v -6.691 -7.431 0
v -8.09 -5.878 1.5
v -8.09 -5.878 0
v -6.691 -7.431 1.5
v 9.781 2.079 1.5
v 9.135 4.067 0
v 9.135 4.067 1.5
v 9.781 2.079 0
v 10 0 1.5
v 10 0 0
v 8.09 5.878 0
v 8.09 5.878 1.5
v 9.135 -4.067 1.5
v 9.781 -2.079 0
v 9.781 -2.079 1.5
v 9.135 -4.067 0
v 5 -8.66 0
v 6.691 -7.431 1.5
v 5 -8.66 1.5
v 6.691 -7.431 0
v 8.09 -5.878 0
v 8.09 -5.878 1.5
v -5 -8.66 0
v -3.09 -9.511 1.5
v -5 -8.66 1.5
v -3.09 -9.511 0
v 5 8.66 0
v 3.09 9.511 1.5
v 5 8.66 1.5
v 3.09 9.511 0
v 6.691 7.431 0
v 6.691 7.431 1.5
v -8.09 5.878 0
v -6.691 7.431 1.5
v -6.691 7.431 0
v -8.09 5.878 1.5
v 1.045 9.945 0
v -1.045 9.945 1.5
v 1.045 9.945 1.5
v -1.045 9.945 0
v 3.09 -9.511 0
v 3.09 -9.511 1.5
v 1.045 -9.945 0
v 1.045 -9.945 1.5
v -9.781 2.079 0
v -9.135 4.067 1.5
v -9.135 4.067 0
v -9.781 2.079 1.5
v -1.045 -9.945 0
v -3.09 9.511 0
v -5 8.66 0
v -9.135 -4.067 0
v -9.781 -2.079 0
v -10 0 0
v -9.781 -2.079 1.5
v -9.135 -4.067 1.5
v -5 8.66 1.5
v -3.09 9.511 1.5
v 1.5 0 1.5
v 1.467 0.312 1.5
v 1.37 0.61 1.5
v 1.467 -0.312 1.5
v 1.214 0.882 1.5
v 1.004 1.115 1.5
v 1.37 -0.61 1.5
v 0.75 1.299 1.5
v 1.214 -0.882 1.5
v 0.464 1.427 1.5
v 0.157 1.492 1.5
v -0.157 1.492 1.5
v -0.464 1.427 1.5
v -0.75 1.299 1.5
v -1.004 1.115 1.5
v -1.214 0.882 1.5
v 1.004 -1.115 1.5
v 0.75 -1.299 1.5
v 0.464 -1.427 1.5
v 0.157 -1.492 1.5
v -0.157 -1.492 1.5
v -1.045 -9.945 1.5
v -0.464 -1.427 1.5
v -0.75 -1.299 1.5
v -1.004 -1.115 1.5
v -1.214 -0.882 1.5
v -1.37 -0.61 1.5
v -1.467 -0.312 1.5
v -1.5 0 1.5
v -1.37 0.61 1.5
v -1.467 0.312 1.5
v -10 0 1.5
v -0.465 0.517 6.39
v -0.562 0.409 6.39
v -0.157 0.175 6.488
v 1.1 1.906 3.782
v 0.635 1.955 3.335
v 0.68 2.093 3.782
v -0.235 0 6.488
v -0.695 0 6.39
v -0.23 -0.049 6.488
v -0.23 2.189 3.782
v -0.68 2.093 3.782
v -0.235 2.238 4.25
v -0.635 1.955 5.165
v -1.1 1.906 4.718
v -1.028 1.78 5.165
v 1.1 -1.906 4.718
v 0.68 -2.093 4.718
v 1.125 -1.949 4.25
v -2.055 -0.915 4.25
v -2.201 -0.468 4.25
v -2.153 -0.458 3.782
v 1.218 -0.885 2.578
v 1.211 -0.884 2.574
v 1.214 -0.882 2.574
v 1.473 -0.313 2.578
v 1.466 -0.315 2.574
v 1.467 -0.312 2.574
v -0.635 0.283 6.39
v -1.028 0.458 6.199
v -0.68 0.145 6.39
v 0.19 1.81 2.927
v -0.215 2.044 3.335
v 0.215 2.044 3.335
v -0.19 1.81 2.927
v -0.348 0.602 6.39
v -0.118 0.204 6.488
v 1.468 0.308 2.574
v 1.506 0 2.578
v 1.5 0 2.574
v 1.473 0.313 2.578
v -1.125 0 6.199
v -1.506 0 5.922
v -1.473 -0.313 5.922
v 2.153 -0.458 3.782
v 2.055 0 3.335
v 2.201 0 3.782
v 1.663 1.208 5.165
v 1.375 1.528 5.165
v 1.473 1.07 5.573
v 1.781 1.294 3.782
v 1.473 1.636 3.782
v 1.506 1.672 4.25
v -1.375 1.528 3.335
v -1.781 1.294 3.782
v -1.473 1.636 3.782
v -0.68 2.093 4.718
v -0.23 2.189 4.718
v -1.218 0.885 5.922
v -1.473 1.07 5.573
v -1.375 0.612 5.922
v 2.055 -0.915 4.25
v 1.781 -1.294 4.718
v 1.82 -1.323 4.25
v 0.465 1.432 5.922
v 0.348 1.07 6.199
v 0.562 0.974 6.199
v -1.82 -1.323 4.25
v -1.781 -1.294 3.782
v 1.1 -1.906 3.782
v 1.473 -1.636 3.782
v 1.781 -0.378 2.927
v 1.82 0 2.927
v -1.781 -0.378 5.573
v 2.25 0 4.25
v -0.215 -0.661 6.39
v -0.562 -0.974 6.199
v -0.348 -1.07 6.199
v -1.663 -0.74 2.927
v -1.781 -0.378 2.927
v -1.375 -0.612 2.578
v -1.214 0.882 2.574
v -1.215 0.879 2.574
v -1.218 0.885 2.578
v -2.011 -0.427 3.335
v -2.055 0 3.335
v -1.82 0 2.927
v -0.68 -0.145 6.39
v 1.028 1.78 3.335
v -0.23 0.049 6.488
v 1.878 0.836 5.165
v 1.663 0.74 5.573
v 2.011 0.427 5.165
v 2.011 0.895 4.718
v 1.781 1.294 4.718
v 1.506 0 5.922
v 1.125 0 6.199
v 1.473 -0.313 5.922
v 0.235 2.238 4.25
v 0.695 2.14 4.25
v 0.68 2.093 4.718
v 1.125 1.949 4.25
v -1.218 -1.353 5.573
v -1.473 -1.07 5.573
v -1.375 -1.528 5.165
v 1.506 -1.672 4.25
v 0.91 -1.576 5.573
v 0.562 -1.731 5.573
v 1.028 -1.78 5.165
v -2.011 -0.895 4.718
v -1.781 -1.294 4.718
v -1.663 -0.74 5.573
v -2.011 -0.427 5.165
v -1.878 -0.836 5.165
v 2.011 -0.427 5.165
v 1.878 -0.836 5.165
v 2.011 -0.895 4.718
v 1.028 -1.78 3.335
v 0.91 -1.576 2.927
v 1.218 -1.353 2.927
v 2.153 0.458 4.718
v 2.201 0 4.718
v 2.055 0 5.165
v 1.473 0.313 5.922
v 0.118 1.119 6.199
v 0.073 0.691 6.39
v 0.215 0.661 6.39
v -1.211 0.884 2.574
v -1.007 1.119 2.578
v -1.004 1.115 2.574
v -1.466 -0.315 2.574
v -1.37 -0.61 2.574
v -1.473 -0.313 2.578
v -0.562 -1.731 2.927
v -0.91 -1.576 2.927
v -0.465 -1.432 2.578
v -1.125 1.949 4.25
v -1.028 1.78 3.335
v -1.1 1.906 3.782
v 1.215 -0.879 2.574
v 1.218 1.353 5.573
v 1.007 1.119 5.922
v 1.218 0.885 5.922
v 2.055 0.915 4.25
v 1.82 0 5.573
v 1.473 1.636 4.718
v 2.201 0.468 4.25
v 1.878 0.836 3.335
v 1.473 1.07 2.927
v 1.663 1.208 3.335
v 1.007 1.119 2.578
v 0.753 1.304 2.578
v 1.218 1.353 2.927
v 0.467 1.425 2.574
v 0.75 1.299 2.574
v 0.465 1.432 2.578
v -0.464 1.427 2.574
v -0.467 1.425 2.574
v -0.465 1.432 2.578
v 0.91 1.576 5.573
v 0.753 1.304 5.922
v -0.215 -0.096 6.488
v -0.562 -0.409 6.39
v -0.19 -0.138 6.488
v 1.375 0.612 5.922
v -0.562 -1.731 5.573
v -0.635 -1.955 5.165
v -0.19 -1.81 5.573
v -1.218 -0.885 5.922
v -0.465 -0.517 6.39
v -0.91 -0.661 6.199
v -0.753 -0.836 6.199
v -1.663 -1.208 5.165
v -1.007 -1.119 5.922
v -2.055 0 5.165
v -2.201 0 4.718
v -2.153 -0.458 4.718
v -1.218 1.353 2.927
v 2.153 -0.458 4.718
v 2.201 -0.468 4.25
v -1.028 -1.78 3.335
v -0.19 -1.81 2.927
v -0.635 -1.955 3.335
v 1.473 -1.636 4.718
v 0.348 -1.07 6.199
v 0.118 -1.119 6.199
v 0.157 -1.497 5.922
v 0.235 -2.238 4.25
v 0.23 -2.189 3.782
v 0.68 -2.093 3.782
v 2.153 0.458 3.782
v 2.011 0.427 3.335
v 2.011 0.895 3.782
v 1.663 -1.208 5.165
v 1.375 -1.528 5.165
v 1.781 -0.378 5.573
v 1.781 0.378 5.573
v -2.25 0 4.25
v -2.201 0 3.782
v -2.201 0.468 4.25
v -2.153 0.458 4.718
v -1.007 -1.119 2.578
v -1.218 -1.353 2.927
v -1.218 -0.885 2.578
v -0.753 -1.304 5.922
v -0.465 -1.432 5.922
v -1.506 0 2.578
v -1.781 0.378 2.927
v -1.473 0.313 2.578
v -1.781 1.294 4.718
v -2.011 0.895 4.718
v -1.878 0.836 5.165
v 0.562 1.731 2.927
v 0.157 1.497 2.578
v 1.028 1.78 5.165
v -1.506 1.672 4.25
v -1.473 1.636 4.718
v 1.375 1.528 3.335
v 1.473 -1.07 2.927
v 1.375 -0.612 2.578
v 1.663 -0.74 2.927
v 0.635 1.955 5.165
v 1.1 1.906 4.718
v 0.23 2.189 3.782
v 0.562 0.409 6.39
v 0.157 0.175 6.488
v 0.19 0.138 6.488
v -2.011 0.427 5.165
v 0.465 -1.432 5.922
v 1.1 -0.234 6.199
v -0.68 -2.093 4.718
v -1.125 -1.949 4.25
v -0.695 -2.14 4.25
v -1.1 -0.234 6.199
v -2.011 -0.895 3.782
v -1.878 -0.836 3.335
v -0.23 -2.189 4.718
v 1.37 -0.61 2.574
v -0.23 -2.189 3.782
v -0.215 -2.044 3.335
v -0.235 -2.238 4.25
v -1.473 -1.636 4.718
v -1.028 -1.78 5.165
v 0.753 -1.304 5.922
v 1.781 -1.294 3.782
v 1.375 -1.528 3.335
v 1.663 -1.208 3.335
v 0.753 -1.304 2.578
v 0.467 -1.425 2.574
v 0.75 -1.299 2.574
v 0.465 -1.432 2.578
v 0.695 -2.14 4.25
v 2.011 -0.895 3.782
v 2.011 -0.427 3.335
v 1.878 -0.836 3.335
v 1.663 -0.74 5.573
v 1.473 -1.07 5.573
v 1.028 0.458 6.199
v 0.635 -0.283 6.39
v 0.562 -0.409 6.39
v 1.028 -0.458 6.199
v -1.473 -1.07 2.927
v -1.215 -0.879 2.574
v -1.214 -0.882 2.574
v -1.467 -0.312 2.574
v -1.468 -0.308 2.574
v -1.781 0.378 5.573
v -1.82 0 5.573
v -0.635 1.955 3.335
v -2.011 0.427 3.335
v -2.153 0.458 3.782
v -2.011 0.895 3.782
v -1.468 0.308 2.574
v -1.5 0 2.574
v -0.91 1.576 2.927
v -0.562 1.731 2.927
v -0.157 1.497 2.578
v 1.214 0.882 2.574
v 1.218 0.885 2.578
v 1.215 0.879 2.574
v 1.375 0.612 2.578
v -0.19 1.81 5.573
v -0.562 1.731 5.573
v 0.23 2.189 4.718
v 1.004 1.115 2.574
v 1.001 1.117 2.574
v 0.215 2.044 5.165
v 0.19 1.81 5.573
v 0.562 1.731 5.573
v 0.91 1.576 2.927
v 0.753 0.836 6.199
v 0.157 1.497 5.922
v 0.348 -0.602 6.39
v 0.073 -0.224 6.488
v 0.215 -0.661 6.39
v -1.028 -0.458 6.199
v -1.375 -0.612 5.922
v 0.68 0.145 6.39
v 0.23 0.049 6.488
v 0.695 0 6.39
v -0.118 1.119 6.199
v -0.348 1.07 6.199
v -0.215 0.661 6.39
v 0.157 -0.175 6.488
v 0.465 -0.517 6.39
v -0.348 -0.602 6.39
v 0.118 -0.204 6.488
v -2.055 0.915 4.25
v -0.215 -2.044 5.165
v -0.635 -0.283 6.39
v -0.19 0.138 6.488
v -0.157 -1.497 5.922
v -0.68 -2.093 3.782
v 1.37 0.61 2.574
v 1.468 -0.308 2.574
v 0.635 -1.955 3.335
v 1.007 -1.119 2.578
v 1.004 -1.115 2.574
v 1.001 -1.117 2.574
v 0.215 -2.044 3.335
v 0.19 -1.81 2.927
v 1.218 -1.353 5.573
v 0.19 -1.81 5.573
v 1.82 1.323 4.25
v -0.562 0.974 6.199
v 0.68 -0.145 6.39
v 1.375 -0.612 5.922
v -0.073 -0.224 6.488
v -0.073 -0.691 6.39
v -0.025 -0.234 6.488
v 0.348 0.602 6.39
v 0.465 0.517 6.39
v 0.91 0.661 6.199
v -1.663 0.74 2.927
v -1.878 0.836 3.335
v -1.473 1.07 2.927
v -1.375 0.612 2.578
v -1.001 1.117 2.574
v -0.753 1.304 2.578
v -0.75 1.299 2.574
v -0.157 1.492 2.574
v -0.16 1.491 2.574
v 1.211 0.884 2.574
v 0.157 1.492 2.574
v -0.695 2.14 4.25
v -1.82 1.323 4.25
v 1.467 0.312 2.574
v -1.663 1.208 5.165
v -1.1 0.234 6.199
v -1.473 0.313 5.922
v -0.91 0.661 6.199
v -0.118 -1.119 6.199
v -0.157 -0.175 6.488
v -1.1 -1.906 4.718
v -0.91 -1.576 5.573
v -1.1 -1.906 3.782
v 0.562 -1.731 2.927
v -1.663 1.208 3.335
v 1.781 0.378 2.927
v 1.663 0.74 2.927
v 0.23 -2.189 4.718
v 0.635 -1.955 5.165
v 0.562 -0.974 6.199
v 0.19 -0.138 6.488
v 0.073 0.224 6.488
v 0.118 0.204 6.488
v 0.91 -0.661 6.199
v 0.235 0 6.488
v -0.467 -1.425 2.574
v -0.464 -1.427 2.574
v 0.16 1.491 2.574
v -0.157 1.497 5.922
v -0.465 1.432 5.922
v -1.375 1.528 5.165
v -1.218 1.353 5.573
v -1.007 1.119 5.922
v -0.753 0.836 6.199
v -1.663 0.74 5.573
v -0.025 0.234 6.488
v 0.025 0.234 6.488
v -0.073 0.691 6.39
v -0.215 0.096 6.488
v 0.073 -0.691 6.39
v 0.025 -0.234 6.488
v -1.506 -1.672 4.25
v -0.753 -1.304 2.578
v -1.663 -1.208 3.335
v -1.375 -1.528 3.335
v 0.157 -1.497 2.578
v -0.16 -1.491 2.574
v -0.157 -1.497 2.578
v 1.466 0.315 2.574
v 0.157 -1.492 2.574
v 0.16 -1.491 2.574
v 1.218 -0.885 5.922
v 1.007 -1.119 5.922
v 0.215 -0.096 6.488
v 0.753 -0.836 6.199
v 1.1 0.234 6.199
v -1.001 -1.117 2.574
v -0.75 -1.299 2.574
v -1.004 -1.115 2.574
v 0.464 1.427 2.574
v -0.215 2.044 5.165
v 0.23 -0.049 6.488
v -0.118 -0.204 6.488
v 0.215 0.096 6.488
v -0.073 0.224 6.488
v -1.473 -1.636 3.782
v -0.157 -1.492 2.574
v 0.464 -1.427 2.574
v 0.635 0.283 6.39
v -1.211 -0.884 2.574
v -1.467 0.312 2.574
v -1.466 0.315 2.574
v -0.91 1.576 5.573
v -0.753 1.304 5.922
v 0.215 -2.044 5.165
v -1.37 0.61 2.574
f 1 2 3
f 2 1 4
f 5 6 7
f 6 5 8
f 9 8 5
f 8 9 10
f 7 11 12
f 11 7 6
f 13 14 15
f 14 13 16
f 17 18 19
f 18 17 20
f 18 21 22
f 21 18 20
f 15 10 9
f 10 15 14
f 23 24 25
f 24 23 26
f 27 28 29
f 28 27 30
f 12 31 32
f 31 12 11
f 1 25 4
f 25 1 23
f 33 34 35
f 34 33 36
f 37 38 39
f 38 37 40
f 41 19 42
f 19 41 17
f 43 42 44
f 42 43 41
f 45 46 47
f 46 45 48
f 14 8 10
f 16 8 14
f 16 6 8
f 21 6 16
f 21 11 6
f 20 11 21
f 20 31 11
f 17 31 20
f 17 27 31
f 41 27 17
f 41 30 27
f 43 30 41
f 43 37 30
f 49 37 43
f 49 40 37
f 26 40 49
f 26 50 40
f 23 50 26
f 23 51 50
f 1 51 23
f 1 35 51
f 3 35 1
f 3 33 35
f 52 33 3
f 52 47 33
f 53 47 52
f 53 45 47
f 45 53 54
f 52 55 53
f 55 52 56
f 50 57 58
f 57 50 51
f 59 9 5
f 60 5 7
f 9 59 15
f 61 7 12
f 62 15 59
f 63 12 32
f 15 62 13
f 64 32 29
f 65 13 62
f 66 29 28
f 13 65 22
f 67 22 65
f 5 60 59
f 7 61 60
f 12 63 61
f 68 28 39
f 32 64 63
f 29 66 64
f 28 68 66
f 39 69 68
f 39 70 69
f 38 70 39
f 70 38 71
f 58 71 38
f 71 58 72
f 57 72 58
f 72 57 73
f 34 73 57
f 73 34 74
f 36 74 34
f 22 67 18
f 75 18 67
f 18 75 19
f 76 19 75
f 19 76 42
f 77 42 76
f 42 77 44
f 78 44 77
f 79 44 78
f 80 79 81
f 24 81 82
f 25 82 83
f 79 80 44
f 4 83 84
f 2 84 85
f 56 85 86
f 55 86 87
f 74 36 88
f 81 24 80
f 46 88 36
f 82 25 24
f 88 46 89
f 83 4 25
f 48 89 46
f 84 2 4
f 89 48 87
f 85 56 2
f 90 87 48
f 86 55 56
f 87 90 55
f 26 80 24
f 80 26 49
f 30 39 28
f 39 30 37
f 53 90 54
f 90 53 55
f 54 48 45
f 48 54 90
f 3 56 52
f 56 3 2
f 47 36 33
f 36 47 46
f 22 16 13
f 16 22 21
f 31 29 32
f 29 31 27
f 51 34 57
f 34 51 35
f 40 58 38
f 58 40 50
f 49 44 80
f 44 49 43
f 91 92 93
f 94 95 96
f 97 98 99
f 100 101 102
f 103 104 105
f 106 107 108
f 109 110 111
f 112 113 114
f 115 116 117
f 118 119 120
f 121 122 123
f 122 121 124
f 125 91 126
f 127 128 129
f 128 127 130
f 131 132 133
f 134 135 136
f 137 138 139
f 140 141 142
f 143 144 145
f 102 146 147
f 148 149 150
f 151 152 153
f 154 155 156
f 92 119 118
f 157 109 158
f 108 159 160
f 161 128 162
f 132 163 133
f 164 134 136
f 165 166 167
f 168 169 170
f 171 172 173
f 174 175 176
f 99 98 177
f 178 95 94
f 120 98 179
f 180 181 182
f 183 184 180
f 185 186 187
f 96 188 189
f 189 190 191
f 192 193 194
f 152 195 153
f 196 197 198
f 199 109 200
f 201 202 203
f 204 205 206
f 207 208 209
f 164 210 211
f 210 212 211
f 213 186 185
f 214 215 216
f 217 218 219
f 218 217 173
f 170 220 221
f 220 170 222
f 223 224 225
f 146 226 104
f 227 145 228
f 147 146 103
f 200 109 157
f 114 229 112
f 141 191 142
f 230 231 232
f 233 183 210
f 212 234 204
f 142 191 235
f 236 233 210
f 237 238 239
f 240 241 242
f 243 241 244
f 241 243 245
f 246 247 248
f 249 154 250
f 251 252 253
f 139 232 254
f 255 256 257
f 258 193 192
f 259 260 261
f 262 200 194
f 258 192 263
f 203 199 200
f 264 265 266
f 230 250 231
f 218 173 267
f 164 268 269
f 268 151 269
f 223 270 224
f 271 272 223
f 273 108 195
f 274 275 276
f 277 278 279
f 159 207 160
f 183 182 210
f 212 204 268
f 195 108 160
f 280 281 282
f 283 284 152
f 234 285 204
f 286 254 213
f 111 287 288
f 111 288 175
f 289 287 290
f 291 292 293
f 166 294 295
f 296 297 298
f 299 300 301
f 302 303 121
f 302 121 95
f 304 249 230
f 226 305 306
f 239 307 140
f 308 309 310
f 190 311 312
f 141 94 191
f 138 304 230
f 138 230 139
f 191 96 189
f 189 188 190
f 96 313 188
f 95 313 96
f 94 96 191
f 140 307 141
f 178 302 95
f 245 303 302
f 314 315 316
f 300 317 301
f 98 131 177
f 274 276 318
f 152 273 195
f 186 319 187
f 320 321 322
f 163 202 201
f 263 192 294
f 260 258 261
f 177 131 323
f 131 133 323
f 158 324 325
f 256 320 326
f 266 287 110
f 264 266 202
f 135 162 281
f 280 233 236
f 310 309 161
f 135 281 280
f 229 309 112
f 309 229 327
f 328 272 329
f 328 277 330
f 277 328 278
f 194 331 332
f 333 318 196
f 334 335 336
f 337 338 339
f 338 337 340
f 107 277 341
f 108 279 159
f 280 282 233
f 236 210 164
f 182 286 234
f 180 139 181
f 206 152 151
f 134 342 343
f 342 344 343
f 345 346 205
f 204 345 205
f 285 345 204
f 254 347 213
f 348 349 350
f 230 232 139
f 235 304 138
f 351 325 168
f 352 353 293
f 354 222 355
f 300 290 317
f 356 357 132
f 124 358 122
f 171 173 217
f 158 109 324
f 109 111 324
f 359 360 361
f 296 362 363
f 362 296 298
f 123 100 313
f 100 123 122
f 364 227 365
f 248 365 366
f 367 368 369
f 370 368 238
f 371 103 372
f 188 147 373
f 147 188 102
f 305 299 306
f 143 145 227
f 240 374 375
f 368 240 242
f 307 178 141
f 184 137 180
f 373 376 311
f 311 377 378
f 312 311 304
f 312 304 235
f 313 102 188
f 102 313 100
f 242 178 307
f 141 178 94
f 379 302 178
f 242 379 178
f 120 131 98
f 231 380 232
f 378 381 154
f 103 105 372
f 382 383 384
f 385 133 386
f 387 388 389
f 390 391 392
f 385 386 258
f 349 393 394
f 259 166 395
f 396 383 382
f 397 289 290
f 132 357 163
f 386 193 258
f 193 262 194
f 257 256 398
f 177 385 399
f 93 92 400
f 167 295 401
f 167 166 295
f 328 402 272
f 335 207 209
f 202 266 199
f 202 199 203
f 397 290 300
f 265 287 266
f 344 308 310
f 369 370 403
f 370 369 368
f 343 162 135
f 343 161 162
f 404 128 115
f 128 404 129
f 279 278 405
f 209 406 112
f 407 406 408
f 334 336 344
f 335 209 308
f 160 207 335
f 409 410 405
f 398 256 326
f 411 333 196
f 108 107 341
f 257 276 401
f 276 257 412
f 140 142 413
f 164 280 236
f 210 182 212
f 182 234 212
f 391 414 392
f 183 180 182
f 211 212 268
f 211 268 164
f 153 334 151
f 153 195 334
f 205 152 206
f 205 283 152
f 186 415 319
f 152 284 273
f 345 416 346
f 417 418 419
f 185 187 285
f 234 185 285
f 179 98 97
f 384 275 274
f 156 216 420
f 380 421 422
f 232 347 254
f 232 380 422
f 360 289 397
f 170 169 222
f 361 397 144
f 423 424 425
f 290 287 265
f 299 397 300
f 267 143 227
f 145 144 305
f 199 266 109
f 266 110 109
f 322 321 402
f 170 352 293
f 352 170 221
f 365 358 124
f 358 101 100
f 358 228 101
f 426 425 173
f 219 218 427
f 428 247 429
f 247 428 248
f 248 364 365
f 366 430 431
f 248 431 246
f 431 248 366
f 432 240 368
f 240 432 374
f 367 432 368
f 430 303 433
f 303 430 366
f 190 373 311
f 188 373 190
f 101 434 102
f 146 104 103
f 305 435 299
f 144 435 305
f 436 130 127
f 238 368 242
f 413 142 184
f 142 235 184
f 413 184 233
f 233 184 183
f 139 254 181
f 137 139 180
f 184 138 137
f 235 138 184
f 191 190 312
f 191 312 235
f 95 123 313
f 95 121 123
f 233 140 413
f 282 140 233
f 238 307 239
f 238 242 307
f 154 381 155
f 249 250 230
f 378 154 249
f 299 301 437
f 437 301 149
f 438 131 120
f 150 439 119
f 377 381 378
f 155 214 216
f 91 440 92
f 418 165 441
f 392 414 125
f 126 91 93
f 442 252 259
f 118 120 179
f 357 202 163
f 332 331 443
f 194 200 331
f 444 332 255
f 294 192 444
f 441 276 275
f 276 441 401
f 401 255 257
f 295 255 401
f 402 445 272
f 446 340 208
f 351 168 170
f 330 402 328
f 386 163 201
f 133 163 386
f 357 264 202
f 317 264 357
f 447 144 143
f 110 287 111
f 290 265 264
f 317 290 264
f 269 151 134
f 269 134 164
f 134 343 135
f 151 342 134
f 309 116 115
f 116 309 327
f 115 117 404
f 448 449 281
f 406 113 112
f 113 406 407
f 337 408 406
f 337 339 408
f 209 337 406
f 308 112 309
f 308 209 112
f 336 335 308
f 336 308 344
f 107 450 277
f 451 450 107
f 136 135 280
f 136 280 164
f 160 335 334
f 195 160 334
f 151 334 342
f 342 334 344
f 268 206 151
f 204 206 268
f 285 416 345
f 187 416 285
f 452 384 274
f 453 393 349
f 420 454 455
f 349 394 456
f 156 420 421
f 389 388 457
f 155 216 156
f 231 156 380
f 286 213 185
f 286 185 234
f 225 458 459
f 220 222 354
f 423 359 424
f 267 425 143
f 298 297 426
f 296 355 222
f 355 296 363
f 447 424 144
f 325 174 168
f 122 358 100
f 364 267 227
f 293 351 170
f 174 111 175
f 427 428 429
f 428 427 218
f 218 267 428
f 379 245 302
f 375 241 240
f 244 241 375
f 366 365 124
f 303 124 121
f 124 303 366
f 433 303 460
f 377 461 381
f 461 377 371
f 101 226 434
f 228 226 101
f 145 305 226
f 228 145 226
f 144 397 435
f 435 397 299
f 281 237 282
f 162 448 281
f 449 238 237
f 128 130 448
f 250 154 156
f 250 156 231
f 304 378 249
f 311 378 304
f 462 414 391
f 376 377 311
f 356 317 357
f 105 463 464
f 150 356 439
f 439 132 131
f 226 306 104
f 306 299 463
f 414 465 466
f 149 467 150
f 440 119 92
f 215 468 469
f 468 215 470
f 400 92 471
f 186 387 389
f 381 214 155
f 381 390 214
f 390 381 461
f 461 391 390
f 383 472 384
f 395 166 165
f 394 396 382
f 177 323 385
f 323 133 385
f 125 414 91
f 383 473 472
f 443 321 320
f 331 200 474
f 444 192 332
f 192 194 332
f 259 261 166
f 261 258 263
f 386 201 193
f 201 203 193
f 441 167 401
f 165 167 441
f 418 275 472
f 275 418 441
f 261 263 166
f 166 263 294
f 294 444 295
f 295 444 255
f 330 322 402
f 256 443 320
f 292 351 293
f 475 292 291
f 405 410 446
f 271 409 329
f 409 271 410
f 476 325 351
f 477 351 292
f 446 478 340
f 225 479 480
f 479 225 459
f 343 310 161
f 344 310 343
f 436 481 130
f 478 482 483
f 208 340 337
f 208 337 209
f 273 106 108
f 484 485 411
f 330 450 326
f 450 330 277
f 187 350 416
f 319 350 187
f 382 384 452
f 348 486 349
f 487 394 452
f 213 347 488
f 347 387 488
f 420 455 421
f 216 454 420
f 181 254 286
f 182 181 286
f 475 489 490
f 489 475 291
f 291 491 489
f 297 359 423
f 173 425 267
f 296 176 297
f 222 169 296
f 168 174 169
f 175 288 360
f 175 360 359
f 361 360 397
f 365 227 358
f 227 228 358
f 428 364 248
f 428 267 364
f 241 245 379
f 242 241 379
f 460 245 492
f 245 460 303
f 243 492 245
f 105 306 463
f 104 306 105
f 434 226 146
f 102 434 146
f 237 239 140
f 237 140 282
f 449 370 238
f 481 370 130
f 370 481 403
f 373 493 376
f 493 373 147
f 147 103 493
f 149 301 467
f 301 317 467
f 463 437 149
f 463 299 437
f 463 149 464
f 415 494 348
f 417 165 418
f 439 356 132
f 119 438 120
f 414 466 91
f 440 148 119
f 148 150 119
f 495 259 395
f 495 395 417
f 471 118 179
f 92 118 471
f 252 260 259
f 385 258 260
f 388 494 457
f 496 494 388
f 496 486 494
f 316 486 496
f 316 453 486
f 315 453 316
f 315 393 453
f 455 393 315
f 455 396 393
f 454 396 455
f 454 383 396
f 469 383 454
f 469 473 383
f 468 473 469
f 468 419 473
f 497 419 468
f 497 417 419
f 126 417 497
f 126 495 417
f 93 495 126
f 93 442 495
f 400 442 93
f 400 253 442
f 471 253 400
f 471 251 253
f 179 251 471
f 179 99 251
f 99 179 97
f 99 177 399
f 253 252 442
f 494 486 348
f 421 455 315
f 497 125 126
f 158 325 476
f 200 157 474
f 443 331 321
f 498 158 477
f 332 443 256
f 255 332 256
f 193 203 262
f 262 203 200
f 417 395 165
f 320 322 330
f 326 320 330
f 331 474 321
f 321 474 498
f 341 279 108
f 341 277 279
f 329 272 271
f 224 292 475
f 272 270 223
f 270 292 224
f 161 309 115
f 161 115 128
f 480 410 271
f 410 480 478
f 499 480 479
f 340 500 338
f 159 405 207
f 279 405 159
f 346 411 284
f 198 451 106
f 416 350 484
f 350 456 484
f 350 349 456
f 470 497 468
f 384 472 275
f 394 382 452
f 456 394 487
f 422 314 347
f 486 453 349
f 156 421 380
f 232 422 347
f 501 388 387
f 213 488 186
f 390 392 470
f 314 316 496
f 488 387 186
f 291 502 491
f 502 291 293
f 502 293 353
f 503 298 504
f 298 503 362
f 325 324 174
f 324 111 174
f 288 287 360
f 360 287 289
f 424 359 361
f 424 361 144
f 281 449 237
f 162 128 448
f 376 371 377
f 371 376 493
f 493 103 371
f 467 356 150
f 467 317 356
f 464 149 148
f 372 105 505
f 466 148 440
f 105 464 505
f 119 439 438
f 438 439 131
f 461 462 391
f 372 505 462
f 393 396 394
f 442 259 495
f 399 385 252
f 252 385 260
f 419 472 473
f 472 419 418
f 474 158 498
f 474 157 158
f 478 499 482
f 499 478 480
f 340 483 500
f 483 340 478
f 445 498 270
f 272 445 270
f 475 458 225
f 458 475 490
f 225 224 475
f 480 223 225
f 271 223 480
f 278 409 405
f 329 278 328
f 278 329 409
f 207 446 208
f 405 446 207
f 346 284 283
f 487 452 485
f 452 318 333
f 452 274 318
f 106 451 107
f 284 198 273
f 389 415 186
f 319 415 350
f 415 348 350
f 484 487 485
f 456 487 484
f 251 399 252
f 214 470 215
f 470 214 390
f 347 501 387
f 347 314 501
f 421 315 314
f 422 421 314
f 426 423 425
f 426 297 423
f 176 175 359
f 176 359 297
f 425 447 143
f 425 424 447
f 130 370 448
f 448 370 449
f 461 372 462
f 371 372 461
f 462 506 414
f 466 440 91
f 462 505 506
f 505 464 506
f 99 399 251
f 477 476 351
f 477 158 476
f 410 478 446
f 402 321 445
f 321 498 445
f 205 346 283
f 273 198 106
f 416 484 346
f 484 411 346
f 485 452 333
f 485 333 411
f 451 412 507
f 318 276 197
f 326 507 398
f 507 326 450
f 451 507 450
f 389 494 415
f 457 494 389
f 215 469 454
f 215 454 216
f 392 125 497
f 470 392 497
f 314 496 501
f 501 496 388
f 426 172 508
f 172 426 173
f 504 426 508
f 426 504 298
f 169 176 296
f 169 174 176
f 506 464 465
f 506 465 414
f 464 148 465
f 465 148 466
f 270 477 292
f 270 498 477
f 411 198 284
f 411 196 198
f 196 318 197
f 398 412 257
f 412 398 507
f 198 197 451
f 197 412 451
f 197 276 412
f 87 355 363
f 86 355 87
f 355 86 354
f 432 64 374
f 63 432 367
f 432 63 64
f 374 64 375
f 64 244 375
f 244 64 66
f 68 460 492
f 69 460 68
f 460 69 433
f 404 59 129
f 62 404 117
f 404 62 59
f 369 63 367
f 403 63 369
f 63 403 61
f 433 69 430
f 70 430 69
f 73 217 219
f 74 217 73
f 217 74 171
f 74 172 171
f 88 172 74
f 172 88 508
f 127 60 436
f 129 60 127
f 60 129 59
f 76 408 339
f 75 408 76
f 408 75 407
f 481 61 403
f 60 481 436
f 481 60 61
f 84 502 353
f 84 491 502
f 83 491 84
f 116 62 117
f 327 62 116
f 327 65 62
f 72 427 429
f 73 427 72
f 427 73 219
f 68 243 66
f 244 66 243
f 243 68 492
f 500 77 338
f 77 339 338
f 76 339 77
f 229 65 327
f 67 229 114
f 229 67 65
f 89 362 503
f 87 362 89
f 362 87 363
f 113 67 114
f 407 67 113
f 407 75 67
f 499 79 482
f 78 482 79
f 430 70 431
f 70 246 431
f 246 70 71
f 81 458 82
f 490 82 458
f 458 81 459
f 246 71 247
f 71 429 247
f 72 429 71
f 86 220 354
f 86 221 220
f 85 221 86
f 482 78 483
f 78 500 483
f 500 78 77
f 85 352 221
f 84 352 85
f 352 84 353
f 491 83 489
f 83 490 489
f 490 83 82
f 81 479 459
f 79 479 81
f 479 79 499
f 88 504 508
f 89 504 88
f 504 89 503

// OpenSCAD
HEIGHT = 6.5;
BASE_DIA = 20;
BASE_THICKNESS = 1.5;
COLUMN_DIA = 3;
HEAD_DIA = 4.5;

$fn = 30;

union() {
    cylinder(d = BASE_DIA, h = BASE_THICKNESS);
    translate([0, 0, HEIGHT-HEAD_DIA/2])
    sphere(d = HEAD_DIA, center = true);
    cylinder(d = COLUMN_DIA, h = HEIGHT-HEAD_DIA/2);
}
